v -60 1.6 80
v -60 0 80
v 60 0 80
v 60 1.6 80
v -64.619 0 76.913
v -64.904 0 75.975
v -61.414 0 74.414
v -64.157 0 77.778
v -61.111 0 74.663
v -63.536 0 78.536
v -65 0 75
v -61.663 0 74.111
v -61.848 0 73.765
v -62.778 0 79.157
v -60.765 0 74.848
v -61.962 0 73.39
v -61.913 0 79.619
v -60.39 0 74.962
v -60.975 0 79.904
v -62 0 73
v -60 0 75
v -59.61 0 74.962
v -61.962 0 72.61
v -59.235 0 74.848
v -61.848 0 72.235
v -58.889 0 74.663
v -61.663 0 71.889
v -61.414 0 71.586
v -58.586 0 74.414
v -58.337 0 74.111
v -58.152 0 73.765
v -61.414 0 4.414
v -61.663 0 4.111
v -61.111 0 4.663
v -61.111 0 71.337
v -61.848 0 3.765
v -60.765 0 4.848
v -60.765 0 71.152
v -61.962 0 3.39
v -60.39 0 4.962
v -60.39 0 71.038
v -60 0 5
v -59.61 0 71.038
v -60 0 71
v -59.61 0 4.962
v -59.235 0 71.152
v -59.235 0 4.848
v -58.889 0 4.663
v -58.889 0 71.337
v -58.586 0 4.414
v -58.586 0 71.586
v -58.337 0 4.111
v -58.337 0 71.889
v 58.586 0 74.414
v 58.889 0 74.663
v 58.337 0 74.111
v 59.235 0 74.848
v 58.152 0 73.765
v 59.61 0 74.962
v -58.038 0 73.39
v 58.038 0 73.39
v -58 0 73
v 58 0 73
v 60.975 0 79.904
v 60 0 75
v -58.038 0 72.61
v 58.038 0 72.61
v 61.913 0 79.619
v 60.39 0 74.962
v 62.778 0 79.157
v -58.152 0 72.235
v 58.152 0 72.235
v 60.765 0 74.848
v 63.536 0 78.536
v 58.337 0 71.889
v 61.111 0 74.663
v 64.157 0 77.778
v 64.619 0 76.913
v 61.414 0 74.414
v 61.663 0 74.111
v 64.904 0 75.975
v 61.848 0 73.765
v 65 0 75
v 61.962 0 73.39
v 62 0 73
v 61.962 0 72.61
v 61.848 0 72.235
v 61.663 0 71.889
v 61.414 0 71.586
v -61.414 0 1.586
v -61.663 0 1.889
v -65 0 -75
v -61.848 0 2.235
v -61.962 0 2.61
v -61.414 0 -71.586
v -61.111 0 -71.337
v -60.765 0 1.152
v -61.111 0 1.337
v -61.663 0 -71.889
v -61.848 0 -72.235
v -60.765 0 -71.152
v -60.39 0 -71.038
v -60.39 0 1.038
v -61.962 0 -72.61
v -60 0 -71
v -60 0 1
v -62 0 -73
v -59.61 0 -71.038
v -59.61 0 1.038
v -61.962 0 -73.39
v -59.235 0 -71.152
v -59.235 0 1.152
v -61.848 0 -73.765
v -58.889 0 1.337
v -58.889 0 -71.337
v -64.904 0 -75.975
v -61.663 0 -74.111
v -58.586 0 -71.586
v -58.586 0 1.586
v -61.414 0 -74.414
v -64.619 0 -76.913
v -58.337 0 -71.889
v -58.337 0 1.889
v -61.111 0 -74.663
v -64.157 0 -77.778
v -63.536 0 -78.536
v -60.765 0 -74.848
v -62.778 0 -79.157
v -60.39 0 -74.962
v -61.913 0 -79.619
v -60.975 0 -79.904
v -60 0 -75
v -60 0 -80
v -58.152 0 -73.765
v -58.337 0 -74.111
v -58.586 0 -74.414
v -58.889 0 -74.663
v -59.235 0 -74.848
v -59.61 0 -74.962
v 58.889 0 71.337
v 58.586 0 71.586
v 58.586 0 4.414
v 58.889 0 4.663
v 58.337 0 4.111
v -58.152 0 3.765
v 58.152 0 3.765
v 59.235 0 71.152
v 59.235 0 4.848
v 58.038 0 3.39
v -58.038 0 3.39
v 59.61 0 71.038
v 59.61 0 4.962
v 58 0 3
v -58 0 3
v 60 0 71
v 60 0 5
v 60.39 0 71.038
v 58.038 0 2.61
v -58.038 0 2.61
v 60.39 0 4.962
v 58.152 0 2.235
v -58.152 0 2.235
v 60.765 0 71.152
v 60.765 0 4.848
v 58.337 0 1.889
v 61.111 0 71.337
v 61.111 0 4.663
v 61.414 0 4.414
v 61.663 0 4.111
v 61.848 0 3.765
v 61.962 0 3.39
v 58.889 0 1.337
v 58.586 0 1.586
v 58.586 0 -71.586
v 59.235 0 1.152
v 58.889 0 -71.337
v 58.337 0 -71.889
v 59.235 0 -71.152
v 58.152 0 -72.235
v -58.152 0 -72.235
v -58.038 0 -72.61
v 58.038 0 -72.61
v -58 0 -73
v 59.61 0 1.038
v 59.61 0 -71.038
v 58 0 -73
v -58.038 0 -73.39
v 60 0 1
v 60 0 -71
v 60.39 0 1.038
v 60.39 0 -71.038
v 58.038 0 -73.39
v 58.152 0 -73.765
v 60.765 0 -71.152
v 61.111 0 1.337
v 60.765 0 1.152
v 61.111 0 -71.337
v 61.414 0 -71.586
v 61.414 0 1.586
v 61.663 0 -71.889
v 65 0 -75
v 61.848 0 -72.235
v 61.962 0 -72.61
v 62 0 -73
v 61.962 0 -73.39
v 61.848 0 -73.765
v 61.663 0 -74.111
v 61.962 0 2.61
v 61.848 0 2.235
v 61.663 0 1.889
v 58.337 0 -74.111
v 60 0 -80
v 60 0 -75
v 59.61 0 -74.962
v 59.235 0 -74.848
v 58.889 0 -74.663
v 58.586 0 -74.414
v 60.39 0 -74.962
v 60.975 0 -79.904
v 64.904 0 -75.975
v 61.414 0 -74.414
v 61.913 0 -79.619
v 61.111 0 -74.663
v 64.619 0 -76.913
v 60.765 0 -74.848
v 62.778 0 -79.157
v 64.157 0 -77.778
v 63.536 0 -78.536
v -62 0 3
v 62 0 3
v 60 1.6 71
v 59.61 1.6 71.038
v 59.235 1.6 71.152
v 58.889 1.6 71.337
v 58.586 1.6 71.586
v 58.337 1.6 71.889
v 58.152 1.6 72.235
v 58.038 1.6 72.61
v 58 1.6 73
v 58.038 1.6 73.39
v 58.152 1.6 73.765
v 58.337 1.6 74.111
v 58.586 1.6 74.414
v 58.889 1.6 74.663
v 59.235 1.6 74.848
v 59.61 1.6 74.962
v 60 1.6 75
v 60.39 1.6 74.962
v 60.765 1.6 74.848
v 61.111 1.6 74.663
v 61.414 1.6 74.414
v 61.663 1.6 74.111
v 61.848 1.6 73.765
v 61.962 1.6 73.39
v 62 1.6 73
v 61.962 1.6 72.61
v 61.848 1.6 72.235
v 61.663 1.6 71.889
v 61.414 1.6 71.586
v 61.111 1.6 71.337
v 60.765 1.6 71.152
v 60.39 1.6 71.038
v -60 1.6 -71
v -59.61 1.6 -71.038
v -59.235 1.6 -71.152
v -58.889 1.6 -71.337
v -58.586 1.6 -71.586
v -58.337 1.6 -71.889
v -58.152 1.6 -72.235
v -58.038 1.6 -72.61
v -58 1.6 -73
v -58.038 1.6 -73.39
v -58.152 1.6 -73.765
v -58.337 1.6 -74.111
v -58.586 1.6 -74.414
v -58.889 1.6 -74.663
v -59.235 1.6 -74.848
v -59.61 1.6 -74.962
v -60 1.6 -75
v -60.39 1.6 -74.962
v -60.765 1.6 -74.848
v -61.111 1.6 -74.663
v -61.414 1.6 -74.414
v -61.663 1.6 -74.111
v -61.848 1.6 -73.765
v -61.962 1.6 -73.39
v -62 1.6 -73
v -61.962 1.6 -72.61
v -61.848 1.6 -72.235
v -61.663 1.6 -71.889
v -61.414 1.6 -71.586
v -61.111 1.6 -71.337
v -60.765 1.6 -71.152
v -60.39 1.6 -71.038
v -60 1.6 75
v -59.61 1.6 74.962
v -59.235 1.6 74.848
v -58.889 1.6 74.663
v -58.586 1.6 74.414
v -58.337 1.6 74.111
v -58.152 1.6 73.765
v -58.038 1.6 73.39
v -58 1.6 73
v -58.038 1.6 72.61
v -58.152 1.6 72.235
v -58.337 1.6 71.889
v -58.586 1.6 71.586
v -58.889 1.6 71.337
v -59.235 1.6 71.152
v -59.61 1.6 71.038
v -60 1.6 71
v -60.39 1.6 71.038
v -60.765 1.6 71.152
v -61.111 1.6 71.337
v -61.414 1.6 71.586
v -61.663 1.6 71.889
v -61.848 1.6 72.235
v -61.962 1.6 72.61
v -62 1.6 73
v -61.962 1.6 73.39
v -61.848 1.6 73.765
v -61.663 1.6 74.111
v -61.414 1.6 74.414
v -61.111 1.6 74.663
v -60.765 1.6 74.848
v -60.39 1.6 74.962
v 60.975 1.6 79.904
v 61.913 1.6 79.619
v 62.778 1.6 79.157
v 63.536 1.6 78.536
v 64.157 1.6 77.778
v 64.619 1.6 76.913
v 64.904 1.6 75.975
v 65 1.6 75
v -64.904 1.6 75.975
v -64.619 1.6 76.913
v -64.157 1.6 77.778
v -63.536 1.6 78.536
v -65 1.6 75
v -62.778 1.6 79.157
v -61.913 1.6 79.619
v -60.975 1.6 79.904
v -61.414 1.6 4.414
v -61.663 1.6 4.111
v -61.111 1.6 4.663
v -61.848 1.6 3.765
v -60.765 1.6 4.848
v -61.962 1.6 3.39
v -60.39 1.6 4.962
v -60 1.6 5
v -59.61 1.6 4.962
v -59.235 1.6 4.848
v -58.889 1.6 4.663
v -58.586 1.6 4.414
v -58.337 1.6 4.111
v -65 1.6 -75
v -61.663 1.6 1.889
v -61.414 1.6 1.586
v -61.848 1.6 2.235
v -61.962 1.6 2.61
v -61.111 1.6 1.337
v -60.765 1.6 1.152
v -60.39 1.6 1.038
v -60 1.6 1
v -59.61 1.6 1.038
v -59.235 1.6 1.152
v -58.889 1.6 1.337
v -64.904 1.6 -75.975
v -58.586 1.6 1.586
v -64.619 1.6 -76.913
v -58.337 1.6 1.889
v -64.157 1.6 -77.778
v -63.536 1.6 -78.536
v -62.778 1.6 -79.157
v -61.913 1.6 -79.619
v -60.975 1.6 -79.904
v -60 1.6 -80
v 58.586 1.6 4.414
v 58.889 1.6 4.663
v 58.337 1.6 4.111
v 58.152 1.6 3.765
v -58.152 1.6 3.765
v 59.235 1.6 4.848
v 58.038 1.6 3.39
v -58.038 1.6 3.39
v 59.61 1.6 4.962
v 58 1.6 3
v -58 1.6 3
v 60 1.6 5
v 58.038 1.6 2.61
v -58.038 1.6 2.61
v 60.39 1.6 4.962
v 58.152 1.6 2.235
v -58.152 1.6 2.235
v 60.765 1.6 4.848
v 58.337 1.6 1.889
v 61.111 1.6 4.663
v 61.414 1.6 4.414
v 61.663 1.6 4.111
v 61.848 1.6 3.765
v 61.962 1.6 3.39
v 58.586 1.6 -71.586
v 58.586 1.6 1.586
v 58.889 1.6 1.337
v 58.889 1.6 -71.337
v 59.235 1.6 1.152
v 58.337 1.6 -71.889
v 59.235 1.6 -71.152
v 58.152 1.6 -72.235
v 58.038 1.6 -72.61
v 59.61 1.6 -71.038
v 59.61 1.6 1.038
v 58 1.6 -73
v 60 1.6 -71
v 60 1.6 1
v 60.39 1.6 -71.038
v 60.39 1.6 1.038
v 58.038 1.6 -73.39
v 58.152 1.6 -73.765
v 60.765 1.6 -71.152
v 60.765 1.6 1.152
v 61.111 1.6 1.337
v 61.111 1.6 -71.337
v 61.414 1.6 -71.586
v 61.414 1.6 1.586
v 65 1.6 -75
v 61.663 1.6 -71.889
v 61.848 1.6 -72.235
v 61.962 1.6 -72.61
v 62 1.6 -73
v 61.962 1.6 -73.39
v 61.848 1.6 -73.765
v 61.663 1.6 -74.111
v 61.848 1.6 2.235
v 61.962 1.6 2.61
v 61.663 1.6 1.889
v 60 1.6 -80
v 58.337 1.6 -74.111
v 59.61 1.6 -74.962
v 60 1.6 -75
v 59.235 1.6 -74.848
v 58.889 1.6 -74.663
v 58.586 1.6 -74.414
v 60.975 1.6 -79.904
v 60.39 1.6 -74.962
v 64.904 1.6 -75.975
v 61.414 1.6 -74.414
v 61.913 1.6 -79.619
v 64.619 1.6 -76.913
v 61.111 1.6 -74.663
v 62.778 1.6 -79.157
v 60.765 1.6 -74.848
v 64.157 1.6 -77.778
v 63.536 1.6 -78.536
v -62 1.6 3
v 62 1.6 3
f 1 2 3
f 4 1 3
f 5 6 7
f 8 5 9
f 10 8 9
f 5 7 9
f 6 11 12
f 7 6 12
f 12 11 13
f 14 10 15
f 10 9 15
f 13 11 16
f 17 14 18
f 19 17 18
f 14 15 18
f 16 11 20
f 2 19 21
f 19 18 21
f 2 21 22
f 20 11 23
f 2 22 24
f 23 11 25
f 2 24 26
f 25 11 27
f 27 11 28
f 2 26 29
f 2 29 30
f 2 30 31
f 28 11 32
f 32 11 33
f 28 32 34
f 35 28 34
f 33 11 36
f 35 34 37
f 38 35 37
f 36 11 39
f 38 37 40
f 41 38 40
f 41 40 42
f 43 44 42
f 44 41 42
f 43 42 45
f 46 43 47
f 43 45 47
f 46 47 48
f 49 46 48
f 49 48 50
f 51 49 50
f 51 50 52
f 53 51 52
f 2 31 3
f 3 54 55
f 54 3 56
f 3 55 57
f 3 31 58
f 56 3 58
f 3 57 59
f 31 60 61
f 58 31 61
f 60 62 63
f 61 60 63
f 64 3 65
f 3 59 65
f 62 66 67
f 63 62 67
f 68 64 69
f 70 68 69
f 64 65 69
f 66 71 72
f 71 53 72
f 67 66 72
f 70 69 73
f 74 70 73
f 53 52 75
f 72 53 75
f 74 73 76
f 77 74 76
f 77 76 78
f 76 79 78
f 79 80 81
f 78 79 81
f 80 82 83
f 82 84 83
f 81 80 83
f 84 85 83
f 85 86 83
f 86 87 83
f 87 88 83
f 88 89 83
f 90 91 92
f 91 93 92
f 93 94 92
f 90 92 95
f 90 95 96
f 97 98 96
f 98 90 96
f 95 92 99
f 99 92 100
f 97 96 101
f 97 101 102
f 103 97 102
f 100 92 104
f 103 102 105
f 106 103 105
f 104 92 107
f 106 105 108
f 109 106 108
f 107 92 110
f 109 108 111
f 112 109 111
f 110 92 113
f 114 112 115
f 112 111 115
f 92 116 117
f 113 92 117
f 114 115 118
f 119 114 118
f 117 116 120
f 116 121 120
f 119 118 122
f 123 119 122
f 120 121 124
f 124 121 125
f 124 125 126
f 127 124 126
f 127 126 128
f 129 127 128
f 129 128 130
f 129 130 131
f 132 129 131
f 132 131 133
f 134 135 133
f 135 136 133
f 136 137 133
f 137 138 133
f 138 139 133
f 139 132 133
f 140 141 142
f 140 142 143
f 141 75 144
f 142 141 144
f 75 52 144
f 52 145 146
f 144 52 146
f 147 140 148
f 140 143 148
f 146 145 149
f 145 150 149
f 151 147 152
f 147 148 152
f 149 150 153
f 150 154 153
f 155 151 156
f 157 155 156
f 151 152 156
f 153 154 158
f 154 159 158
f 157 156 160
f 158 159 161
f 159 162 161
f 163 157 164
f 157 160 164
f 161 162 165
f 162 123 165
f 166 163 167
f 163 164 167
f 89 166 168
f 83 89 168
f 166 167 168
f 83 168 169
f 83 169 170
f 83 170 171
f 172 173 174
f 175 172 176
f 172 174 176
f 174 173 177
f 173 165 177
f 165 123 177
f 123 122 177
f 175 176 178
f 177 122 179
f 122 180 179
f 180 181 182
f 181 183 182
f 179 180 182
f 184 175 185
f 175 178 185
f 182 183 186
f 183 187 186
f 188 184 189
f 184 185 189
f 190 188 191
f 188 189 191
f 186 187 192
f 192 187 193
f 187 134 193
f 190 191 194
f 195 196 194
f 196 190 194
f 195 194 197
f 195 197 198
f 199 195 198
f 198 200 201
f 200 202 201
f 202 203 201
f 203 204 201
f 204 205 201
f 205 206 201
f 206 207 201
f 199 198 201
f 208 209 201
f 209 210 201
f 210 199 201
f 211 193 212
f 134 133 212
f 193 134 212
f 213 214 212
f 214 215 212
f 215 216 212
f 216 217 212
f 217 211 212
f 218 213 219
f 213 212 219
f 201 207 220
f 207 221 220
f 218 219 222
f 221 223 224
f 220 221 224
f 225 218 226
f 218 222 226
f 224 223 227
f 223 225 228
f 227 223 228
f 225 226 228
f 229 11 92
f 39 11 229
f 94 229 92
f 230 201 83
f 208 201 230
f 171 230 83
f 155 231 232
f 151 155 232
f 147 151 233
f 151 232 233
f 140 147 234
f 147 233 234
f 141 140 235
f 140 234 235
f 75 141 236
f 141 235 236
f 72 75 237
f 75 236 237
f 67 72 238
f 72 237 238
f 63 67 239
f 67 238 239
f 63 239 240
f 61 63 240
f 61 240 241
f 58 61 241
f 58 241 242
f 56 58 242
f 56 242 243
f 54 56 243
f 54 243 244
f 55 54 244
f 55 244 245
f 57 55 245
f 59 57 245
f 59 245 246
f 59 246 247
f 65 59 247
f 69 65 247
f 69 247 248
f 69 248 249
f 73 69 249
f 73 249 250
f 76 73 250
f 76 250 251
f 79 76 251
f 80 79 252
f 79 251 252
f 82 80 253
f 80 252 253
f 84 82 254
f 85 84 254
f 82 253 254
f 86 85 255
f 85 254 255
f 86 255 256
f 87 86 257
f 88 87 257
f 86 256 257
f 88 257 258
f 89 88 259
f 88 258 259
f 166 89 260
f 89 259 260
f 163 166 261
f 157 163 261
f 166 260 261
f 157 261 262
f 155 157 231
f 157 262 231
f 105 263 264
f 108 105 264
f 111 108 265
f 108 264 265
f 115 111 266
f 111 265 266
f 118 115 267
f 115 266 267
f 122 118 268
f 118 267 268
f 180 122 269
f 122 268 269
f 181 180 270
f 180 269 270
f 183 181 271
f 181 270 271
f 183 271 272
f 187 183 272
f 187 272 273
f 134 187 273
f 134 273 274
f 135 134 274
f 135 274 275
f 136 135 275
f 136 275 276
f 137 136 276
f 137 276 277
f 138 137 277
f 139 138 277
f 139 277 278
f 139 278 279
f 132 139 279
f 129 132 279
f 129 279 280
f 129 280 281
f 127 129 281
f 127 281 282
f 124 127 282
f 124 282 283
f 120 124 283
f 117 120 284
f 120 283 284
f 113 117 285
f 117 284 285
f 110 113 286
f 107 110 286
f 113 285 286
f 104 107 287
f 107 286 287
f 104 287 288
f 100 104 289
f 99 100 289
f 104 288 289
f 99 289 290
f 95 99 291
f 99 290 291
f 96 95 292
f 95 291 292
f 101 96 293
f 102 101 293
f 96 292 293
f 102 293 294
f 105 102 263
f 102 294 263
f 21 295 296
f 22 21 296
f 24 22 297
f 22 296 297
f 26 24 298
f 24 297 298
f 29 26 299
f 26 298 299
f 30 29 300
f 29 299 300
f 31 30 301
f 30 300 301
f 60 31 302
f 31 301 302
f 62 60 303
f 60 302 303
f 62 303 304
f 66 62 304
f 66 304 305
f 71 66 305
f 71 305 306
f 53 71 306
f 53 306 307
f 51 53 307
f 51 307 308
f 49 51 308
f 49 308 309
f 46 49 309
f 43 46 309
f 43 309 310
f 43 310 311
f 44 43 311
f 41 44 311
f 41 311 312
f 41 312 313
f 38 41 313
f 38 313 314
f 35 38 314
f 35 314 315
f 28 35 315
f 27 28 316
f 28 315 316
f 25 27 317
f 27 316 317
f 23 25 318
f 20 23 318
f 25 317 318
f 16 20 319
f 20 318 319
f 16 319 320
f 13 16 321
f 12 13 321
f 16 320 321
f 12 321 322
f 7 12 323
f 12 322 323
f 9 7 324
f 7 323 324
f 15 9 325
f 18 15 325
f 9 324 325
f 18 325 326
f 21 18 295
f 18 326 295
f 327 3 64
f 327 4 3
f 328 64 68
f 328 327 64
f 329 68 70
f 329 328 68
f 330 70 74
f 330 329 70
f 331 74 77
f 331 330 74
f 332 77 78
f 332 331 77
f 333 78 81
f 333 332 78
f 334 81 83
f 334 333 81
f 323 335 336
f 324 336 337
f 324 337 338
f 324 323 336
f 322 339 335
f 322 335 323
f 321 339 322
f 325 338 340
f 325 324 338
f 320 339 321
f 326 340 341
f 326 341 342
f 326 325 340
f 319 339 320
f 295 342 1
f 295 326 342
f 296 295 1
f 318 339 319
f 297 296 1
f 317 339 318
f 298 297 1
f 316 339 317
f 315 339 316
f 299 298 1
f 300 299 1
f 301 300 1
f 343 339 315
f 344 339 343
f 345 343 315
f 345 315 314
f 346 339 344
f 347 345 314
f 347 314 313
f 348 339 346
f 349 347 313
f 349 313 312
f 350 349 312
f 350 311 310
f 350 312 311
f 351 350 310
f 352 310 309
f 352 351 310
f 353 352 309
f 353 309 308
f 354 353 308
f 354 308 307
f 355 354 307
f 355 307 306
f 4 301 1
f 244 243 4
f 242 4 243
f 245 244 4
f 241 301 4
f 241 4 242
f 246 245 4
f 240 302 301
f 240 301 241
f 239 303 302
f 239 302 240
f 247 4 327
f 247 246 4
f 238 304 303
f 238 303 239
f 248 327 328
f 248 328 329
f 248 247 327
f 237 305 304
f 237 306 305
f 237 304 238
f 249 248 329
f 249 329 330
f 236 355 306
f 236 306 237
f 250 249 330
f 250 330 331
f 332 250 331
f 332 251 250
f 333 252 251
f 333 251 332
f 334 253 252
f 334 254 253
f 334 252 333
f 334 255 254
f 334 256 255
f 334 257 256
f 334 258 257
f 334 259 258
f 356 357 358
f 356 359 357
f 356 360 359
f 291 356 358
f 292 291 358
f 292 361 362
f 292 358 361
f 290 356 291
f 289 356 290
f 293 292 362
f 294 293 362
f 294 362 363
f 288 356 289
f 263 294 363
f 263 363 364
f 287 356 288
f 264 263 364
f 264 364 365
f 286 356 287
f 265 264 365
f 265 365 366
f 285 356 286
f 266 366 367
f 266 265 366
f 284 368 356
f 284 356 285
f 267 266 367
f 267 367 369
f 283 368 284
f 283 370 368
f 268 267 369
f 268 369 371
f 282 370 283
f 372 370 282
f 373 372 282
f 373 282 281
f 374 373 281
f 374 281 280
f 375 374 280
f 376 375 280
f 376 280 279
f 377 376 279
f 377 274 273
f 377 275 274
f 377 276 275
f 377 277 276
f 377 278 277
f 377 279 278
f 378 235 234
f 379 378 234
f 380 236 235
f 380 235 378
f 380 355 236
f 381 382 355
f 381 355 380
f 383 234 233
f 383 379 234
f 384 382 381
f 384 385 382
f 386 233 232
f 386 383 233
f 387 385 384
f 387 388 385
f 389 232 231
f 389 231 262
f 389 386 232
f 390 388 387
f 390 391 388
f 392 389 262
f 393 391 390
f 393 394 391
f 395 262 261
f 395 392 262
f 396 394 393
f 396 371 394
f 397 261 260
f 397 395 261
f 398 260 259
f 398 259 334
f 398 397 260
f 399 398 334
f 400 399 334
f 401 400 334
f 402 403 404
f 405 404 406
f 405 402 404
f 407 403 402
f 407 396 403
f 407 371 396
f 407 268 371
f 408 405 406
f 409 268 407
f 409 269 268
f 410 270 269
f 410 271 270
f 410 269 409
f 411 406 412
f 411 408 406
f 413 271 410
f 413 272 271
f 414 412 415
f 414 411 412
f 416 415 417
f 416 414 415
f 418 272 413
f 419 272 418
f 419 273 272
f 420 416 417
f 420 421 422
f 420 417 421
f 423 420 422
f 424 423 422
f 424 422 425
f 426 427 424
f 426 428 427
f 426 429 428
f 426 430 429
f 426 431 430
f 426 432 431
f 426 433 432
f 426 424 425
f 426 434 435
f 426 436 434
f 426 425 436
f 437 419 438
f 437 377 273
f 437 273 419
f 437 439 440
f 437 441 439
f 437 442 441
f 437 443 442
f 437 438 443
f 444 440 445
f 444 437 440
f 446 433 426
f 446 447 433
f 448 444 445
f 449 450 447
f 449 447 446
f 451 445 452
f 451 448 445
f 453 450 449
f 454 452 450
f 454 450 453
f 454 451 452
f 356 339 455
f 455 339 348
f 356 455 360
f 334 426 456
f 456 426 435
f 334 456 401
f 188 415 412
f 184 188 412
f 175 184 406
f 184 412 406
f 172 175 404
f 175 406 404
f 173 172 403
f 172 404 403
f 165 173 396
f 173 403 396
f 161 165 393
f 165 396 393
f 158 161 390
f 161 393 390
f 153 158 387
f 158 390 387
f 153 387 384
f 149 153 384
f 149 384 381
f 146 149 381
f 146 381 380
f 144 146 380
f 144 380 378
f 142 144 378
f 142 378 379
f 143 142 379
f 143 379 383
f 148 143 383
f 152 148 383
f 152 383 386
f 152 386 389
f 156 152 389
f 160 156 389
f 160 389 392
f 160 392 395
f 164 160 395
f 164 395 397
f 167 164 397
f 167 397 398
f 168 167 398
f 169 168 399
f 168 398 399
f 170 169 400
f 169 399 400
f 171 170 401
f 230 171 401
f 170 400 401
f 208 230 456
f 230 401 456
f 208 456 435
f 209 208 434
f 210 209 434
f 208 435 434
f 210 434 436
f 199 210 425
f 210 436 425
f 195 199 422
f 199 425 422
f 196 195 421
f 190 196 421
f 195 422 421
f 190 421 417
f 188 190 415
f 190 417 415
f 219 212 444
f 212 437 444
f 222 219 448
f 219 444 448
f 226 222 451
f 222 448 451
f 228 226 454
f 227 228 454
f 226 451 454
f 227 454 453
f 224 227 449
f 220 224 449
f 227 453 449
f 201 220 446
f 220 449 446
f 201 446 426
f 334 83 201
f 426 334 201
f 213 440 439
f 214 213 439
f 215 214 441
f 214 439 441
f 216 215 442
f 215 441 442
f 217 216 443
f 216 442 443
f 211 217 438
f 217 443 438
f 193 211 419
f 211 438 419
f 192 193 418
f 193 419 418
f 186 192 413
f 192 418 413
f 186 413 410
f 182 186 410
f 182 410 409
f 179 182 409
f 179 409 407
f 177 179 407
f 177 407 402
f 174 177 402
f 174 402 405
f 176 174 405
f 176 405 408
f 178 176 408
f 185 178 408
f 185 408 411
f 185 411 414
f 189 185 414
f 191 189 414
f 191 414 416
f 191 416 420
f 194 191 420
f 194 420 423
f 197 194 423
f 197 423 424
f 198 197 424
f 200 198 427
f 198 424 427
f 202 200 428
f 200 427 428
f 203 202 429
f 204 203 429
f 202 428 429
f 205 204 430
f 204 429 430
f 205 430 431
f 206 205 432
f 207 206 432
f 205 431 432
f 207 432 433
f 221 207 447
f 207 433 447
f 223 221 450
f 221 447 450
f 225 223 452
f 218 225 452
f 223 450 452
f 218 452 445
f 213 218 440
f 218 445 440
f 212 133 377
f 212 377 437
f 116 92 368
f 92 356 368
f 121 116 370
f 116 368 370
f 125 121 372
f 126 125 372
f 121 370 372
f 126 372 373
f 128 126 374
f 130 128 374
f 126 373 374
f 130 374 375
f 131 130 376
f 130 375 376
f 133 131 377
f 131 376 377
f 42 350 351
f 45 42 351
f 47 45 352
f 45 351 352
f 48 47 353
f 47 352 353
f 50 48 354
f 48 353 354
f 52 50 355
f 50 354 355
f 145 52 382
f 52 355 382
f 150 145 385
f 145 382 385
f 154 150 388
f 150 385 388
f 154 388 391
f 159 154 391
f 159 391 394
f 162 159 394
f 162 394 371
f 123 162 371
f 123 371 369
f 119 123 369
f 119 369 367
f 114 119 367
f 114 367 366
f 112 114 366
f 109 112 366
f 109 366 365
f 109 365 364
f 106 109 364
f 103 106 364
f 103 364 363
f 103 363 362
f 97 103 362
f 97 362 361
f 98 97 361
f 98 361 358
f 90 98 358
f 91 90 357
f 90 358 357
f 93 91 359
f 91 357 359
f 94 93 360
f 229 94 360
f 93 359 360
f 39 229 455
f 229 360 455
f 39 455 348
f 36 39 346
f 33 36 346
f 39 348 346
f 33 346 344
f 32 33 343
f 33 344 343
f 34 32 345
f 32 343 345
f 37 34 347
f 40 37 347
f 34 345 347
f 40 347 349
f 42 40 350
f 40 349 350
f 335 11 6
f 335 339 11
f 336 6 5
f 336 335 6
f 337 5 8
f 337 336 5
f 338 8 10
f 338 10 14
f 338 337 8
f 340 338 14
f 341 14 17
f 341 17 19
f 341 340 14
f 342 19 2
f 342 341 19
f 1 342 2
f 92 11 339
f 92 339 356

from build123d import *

# Parameters (mm, degrees)
ESQUISSE1_W             = 130
ESQUISSE1_H             = 160
BOSS_EXTRU_1_DEPTH      = 1.6
ESQUISSE2_R             = 2
ENL_V_MAT_EXTRU_1_DEPTH = 104.090057717
CONG_1_R                = 5


with BuildPart() as part:
    # Esquisse1 → Boss.-Extru.1 (new body)
    with BuildSketch(Plane(origin=(0, 0, 0), x_dir=(1, 0, 0), z_dir=(0, 1, 0))):
        Rectangle(ESQUISSE1_W, ESQUISSE1_H)
    extrude(amount=BOSS_EXTRU_1_DEPTH)

    # Esquisse2 → Enlèv. mat.-Extru.1 (cut, through all)
    with BuildSketch(Plane(origin=(0, 1.6, 0), x_dir=(1, 0, 0), z_dir=(0, 1, 0))):
        with Locations(Location((-60, 73, 0), (0, 0, 270))):
            Circle(ESQUISSE2_R)
        with Locations(Location((-60, -3, 0), (0, 0, 270))):
            Circle(ESQUISSE2_R)
        with Locations(Location((-60, -73, 0), (0, 0, 270))):
            Circle(ESQUISSE2_R)
        with Locations(Location((60, -73, 0), (0, 0, 90))):
            Circle(ESQUISSE2_R)
        with Locations(Location((60, -3, 0), (0, 0, 90))):
            Circle(ESQUISSE2_R)
        with Locations(Location((60, 73, 0), (0, 0, 90))):
            Circle(ESQUISSE2_R)
    extrude(amount=-ENL_V_MAT_EXTRU_1_DEPTH, mode=Mode.SUBTRACT)

    # Congé1
    cong_1_edges = [part.edges().sort_by_distance(p)[0] for p in [
        (65, 0.8, 80),
        (-65, 0.8, 80),
        (-65, 0.8, -80),
        (65, 0.8, -80),
    ]]
    fillet(cong_1_edges, radius=CONG_1_R)


solid = part.part
